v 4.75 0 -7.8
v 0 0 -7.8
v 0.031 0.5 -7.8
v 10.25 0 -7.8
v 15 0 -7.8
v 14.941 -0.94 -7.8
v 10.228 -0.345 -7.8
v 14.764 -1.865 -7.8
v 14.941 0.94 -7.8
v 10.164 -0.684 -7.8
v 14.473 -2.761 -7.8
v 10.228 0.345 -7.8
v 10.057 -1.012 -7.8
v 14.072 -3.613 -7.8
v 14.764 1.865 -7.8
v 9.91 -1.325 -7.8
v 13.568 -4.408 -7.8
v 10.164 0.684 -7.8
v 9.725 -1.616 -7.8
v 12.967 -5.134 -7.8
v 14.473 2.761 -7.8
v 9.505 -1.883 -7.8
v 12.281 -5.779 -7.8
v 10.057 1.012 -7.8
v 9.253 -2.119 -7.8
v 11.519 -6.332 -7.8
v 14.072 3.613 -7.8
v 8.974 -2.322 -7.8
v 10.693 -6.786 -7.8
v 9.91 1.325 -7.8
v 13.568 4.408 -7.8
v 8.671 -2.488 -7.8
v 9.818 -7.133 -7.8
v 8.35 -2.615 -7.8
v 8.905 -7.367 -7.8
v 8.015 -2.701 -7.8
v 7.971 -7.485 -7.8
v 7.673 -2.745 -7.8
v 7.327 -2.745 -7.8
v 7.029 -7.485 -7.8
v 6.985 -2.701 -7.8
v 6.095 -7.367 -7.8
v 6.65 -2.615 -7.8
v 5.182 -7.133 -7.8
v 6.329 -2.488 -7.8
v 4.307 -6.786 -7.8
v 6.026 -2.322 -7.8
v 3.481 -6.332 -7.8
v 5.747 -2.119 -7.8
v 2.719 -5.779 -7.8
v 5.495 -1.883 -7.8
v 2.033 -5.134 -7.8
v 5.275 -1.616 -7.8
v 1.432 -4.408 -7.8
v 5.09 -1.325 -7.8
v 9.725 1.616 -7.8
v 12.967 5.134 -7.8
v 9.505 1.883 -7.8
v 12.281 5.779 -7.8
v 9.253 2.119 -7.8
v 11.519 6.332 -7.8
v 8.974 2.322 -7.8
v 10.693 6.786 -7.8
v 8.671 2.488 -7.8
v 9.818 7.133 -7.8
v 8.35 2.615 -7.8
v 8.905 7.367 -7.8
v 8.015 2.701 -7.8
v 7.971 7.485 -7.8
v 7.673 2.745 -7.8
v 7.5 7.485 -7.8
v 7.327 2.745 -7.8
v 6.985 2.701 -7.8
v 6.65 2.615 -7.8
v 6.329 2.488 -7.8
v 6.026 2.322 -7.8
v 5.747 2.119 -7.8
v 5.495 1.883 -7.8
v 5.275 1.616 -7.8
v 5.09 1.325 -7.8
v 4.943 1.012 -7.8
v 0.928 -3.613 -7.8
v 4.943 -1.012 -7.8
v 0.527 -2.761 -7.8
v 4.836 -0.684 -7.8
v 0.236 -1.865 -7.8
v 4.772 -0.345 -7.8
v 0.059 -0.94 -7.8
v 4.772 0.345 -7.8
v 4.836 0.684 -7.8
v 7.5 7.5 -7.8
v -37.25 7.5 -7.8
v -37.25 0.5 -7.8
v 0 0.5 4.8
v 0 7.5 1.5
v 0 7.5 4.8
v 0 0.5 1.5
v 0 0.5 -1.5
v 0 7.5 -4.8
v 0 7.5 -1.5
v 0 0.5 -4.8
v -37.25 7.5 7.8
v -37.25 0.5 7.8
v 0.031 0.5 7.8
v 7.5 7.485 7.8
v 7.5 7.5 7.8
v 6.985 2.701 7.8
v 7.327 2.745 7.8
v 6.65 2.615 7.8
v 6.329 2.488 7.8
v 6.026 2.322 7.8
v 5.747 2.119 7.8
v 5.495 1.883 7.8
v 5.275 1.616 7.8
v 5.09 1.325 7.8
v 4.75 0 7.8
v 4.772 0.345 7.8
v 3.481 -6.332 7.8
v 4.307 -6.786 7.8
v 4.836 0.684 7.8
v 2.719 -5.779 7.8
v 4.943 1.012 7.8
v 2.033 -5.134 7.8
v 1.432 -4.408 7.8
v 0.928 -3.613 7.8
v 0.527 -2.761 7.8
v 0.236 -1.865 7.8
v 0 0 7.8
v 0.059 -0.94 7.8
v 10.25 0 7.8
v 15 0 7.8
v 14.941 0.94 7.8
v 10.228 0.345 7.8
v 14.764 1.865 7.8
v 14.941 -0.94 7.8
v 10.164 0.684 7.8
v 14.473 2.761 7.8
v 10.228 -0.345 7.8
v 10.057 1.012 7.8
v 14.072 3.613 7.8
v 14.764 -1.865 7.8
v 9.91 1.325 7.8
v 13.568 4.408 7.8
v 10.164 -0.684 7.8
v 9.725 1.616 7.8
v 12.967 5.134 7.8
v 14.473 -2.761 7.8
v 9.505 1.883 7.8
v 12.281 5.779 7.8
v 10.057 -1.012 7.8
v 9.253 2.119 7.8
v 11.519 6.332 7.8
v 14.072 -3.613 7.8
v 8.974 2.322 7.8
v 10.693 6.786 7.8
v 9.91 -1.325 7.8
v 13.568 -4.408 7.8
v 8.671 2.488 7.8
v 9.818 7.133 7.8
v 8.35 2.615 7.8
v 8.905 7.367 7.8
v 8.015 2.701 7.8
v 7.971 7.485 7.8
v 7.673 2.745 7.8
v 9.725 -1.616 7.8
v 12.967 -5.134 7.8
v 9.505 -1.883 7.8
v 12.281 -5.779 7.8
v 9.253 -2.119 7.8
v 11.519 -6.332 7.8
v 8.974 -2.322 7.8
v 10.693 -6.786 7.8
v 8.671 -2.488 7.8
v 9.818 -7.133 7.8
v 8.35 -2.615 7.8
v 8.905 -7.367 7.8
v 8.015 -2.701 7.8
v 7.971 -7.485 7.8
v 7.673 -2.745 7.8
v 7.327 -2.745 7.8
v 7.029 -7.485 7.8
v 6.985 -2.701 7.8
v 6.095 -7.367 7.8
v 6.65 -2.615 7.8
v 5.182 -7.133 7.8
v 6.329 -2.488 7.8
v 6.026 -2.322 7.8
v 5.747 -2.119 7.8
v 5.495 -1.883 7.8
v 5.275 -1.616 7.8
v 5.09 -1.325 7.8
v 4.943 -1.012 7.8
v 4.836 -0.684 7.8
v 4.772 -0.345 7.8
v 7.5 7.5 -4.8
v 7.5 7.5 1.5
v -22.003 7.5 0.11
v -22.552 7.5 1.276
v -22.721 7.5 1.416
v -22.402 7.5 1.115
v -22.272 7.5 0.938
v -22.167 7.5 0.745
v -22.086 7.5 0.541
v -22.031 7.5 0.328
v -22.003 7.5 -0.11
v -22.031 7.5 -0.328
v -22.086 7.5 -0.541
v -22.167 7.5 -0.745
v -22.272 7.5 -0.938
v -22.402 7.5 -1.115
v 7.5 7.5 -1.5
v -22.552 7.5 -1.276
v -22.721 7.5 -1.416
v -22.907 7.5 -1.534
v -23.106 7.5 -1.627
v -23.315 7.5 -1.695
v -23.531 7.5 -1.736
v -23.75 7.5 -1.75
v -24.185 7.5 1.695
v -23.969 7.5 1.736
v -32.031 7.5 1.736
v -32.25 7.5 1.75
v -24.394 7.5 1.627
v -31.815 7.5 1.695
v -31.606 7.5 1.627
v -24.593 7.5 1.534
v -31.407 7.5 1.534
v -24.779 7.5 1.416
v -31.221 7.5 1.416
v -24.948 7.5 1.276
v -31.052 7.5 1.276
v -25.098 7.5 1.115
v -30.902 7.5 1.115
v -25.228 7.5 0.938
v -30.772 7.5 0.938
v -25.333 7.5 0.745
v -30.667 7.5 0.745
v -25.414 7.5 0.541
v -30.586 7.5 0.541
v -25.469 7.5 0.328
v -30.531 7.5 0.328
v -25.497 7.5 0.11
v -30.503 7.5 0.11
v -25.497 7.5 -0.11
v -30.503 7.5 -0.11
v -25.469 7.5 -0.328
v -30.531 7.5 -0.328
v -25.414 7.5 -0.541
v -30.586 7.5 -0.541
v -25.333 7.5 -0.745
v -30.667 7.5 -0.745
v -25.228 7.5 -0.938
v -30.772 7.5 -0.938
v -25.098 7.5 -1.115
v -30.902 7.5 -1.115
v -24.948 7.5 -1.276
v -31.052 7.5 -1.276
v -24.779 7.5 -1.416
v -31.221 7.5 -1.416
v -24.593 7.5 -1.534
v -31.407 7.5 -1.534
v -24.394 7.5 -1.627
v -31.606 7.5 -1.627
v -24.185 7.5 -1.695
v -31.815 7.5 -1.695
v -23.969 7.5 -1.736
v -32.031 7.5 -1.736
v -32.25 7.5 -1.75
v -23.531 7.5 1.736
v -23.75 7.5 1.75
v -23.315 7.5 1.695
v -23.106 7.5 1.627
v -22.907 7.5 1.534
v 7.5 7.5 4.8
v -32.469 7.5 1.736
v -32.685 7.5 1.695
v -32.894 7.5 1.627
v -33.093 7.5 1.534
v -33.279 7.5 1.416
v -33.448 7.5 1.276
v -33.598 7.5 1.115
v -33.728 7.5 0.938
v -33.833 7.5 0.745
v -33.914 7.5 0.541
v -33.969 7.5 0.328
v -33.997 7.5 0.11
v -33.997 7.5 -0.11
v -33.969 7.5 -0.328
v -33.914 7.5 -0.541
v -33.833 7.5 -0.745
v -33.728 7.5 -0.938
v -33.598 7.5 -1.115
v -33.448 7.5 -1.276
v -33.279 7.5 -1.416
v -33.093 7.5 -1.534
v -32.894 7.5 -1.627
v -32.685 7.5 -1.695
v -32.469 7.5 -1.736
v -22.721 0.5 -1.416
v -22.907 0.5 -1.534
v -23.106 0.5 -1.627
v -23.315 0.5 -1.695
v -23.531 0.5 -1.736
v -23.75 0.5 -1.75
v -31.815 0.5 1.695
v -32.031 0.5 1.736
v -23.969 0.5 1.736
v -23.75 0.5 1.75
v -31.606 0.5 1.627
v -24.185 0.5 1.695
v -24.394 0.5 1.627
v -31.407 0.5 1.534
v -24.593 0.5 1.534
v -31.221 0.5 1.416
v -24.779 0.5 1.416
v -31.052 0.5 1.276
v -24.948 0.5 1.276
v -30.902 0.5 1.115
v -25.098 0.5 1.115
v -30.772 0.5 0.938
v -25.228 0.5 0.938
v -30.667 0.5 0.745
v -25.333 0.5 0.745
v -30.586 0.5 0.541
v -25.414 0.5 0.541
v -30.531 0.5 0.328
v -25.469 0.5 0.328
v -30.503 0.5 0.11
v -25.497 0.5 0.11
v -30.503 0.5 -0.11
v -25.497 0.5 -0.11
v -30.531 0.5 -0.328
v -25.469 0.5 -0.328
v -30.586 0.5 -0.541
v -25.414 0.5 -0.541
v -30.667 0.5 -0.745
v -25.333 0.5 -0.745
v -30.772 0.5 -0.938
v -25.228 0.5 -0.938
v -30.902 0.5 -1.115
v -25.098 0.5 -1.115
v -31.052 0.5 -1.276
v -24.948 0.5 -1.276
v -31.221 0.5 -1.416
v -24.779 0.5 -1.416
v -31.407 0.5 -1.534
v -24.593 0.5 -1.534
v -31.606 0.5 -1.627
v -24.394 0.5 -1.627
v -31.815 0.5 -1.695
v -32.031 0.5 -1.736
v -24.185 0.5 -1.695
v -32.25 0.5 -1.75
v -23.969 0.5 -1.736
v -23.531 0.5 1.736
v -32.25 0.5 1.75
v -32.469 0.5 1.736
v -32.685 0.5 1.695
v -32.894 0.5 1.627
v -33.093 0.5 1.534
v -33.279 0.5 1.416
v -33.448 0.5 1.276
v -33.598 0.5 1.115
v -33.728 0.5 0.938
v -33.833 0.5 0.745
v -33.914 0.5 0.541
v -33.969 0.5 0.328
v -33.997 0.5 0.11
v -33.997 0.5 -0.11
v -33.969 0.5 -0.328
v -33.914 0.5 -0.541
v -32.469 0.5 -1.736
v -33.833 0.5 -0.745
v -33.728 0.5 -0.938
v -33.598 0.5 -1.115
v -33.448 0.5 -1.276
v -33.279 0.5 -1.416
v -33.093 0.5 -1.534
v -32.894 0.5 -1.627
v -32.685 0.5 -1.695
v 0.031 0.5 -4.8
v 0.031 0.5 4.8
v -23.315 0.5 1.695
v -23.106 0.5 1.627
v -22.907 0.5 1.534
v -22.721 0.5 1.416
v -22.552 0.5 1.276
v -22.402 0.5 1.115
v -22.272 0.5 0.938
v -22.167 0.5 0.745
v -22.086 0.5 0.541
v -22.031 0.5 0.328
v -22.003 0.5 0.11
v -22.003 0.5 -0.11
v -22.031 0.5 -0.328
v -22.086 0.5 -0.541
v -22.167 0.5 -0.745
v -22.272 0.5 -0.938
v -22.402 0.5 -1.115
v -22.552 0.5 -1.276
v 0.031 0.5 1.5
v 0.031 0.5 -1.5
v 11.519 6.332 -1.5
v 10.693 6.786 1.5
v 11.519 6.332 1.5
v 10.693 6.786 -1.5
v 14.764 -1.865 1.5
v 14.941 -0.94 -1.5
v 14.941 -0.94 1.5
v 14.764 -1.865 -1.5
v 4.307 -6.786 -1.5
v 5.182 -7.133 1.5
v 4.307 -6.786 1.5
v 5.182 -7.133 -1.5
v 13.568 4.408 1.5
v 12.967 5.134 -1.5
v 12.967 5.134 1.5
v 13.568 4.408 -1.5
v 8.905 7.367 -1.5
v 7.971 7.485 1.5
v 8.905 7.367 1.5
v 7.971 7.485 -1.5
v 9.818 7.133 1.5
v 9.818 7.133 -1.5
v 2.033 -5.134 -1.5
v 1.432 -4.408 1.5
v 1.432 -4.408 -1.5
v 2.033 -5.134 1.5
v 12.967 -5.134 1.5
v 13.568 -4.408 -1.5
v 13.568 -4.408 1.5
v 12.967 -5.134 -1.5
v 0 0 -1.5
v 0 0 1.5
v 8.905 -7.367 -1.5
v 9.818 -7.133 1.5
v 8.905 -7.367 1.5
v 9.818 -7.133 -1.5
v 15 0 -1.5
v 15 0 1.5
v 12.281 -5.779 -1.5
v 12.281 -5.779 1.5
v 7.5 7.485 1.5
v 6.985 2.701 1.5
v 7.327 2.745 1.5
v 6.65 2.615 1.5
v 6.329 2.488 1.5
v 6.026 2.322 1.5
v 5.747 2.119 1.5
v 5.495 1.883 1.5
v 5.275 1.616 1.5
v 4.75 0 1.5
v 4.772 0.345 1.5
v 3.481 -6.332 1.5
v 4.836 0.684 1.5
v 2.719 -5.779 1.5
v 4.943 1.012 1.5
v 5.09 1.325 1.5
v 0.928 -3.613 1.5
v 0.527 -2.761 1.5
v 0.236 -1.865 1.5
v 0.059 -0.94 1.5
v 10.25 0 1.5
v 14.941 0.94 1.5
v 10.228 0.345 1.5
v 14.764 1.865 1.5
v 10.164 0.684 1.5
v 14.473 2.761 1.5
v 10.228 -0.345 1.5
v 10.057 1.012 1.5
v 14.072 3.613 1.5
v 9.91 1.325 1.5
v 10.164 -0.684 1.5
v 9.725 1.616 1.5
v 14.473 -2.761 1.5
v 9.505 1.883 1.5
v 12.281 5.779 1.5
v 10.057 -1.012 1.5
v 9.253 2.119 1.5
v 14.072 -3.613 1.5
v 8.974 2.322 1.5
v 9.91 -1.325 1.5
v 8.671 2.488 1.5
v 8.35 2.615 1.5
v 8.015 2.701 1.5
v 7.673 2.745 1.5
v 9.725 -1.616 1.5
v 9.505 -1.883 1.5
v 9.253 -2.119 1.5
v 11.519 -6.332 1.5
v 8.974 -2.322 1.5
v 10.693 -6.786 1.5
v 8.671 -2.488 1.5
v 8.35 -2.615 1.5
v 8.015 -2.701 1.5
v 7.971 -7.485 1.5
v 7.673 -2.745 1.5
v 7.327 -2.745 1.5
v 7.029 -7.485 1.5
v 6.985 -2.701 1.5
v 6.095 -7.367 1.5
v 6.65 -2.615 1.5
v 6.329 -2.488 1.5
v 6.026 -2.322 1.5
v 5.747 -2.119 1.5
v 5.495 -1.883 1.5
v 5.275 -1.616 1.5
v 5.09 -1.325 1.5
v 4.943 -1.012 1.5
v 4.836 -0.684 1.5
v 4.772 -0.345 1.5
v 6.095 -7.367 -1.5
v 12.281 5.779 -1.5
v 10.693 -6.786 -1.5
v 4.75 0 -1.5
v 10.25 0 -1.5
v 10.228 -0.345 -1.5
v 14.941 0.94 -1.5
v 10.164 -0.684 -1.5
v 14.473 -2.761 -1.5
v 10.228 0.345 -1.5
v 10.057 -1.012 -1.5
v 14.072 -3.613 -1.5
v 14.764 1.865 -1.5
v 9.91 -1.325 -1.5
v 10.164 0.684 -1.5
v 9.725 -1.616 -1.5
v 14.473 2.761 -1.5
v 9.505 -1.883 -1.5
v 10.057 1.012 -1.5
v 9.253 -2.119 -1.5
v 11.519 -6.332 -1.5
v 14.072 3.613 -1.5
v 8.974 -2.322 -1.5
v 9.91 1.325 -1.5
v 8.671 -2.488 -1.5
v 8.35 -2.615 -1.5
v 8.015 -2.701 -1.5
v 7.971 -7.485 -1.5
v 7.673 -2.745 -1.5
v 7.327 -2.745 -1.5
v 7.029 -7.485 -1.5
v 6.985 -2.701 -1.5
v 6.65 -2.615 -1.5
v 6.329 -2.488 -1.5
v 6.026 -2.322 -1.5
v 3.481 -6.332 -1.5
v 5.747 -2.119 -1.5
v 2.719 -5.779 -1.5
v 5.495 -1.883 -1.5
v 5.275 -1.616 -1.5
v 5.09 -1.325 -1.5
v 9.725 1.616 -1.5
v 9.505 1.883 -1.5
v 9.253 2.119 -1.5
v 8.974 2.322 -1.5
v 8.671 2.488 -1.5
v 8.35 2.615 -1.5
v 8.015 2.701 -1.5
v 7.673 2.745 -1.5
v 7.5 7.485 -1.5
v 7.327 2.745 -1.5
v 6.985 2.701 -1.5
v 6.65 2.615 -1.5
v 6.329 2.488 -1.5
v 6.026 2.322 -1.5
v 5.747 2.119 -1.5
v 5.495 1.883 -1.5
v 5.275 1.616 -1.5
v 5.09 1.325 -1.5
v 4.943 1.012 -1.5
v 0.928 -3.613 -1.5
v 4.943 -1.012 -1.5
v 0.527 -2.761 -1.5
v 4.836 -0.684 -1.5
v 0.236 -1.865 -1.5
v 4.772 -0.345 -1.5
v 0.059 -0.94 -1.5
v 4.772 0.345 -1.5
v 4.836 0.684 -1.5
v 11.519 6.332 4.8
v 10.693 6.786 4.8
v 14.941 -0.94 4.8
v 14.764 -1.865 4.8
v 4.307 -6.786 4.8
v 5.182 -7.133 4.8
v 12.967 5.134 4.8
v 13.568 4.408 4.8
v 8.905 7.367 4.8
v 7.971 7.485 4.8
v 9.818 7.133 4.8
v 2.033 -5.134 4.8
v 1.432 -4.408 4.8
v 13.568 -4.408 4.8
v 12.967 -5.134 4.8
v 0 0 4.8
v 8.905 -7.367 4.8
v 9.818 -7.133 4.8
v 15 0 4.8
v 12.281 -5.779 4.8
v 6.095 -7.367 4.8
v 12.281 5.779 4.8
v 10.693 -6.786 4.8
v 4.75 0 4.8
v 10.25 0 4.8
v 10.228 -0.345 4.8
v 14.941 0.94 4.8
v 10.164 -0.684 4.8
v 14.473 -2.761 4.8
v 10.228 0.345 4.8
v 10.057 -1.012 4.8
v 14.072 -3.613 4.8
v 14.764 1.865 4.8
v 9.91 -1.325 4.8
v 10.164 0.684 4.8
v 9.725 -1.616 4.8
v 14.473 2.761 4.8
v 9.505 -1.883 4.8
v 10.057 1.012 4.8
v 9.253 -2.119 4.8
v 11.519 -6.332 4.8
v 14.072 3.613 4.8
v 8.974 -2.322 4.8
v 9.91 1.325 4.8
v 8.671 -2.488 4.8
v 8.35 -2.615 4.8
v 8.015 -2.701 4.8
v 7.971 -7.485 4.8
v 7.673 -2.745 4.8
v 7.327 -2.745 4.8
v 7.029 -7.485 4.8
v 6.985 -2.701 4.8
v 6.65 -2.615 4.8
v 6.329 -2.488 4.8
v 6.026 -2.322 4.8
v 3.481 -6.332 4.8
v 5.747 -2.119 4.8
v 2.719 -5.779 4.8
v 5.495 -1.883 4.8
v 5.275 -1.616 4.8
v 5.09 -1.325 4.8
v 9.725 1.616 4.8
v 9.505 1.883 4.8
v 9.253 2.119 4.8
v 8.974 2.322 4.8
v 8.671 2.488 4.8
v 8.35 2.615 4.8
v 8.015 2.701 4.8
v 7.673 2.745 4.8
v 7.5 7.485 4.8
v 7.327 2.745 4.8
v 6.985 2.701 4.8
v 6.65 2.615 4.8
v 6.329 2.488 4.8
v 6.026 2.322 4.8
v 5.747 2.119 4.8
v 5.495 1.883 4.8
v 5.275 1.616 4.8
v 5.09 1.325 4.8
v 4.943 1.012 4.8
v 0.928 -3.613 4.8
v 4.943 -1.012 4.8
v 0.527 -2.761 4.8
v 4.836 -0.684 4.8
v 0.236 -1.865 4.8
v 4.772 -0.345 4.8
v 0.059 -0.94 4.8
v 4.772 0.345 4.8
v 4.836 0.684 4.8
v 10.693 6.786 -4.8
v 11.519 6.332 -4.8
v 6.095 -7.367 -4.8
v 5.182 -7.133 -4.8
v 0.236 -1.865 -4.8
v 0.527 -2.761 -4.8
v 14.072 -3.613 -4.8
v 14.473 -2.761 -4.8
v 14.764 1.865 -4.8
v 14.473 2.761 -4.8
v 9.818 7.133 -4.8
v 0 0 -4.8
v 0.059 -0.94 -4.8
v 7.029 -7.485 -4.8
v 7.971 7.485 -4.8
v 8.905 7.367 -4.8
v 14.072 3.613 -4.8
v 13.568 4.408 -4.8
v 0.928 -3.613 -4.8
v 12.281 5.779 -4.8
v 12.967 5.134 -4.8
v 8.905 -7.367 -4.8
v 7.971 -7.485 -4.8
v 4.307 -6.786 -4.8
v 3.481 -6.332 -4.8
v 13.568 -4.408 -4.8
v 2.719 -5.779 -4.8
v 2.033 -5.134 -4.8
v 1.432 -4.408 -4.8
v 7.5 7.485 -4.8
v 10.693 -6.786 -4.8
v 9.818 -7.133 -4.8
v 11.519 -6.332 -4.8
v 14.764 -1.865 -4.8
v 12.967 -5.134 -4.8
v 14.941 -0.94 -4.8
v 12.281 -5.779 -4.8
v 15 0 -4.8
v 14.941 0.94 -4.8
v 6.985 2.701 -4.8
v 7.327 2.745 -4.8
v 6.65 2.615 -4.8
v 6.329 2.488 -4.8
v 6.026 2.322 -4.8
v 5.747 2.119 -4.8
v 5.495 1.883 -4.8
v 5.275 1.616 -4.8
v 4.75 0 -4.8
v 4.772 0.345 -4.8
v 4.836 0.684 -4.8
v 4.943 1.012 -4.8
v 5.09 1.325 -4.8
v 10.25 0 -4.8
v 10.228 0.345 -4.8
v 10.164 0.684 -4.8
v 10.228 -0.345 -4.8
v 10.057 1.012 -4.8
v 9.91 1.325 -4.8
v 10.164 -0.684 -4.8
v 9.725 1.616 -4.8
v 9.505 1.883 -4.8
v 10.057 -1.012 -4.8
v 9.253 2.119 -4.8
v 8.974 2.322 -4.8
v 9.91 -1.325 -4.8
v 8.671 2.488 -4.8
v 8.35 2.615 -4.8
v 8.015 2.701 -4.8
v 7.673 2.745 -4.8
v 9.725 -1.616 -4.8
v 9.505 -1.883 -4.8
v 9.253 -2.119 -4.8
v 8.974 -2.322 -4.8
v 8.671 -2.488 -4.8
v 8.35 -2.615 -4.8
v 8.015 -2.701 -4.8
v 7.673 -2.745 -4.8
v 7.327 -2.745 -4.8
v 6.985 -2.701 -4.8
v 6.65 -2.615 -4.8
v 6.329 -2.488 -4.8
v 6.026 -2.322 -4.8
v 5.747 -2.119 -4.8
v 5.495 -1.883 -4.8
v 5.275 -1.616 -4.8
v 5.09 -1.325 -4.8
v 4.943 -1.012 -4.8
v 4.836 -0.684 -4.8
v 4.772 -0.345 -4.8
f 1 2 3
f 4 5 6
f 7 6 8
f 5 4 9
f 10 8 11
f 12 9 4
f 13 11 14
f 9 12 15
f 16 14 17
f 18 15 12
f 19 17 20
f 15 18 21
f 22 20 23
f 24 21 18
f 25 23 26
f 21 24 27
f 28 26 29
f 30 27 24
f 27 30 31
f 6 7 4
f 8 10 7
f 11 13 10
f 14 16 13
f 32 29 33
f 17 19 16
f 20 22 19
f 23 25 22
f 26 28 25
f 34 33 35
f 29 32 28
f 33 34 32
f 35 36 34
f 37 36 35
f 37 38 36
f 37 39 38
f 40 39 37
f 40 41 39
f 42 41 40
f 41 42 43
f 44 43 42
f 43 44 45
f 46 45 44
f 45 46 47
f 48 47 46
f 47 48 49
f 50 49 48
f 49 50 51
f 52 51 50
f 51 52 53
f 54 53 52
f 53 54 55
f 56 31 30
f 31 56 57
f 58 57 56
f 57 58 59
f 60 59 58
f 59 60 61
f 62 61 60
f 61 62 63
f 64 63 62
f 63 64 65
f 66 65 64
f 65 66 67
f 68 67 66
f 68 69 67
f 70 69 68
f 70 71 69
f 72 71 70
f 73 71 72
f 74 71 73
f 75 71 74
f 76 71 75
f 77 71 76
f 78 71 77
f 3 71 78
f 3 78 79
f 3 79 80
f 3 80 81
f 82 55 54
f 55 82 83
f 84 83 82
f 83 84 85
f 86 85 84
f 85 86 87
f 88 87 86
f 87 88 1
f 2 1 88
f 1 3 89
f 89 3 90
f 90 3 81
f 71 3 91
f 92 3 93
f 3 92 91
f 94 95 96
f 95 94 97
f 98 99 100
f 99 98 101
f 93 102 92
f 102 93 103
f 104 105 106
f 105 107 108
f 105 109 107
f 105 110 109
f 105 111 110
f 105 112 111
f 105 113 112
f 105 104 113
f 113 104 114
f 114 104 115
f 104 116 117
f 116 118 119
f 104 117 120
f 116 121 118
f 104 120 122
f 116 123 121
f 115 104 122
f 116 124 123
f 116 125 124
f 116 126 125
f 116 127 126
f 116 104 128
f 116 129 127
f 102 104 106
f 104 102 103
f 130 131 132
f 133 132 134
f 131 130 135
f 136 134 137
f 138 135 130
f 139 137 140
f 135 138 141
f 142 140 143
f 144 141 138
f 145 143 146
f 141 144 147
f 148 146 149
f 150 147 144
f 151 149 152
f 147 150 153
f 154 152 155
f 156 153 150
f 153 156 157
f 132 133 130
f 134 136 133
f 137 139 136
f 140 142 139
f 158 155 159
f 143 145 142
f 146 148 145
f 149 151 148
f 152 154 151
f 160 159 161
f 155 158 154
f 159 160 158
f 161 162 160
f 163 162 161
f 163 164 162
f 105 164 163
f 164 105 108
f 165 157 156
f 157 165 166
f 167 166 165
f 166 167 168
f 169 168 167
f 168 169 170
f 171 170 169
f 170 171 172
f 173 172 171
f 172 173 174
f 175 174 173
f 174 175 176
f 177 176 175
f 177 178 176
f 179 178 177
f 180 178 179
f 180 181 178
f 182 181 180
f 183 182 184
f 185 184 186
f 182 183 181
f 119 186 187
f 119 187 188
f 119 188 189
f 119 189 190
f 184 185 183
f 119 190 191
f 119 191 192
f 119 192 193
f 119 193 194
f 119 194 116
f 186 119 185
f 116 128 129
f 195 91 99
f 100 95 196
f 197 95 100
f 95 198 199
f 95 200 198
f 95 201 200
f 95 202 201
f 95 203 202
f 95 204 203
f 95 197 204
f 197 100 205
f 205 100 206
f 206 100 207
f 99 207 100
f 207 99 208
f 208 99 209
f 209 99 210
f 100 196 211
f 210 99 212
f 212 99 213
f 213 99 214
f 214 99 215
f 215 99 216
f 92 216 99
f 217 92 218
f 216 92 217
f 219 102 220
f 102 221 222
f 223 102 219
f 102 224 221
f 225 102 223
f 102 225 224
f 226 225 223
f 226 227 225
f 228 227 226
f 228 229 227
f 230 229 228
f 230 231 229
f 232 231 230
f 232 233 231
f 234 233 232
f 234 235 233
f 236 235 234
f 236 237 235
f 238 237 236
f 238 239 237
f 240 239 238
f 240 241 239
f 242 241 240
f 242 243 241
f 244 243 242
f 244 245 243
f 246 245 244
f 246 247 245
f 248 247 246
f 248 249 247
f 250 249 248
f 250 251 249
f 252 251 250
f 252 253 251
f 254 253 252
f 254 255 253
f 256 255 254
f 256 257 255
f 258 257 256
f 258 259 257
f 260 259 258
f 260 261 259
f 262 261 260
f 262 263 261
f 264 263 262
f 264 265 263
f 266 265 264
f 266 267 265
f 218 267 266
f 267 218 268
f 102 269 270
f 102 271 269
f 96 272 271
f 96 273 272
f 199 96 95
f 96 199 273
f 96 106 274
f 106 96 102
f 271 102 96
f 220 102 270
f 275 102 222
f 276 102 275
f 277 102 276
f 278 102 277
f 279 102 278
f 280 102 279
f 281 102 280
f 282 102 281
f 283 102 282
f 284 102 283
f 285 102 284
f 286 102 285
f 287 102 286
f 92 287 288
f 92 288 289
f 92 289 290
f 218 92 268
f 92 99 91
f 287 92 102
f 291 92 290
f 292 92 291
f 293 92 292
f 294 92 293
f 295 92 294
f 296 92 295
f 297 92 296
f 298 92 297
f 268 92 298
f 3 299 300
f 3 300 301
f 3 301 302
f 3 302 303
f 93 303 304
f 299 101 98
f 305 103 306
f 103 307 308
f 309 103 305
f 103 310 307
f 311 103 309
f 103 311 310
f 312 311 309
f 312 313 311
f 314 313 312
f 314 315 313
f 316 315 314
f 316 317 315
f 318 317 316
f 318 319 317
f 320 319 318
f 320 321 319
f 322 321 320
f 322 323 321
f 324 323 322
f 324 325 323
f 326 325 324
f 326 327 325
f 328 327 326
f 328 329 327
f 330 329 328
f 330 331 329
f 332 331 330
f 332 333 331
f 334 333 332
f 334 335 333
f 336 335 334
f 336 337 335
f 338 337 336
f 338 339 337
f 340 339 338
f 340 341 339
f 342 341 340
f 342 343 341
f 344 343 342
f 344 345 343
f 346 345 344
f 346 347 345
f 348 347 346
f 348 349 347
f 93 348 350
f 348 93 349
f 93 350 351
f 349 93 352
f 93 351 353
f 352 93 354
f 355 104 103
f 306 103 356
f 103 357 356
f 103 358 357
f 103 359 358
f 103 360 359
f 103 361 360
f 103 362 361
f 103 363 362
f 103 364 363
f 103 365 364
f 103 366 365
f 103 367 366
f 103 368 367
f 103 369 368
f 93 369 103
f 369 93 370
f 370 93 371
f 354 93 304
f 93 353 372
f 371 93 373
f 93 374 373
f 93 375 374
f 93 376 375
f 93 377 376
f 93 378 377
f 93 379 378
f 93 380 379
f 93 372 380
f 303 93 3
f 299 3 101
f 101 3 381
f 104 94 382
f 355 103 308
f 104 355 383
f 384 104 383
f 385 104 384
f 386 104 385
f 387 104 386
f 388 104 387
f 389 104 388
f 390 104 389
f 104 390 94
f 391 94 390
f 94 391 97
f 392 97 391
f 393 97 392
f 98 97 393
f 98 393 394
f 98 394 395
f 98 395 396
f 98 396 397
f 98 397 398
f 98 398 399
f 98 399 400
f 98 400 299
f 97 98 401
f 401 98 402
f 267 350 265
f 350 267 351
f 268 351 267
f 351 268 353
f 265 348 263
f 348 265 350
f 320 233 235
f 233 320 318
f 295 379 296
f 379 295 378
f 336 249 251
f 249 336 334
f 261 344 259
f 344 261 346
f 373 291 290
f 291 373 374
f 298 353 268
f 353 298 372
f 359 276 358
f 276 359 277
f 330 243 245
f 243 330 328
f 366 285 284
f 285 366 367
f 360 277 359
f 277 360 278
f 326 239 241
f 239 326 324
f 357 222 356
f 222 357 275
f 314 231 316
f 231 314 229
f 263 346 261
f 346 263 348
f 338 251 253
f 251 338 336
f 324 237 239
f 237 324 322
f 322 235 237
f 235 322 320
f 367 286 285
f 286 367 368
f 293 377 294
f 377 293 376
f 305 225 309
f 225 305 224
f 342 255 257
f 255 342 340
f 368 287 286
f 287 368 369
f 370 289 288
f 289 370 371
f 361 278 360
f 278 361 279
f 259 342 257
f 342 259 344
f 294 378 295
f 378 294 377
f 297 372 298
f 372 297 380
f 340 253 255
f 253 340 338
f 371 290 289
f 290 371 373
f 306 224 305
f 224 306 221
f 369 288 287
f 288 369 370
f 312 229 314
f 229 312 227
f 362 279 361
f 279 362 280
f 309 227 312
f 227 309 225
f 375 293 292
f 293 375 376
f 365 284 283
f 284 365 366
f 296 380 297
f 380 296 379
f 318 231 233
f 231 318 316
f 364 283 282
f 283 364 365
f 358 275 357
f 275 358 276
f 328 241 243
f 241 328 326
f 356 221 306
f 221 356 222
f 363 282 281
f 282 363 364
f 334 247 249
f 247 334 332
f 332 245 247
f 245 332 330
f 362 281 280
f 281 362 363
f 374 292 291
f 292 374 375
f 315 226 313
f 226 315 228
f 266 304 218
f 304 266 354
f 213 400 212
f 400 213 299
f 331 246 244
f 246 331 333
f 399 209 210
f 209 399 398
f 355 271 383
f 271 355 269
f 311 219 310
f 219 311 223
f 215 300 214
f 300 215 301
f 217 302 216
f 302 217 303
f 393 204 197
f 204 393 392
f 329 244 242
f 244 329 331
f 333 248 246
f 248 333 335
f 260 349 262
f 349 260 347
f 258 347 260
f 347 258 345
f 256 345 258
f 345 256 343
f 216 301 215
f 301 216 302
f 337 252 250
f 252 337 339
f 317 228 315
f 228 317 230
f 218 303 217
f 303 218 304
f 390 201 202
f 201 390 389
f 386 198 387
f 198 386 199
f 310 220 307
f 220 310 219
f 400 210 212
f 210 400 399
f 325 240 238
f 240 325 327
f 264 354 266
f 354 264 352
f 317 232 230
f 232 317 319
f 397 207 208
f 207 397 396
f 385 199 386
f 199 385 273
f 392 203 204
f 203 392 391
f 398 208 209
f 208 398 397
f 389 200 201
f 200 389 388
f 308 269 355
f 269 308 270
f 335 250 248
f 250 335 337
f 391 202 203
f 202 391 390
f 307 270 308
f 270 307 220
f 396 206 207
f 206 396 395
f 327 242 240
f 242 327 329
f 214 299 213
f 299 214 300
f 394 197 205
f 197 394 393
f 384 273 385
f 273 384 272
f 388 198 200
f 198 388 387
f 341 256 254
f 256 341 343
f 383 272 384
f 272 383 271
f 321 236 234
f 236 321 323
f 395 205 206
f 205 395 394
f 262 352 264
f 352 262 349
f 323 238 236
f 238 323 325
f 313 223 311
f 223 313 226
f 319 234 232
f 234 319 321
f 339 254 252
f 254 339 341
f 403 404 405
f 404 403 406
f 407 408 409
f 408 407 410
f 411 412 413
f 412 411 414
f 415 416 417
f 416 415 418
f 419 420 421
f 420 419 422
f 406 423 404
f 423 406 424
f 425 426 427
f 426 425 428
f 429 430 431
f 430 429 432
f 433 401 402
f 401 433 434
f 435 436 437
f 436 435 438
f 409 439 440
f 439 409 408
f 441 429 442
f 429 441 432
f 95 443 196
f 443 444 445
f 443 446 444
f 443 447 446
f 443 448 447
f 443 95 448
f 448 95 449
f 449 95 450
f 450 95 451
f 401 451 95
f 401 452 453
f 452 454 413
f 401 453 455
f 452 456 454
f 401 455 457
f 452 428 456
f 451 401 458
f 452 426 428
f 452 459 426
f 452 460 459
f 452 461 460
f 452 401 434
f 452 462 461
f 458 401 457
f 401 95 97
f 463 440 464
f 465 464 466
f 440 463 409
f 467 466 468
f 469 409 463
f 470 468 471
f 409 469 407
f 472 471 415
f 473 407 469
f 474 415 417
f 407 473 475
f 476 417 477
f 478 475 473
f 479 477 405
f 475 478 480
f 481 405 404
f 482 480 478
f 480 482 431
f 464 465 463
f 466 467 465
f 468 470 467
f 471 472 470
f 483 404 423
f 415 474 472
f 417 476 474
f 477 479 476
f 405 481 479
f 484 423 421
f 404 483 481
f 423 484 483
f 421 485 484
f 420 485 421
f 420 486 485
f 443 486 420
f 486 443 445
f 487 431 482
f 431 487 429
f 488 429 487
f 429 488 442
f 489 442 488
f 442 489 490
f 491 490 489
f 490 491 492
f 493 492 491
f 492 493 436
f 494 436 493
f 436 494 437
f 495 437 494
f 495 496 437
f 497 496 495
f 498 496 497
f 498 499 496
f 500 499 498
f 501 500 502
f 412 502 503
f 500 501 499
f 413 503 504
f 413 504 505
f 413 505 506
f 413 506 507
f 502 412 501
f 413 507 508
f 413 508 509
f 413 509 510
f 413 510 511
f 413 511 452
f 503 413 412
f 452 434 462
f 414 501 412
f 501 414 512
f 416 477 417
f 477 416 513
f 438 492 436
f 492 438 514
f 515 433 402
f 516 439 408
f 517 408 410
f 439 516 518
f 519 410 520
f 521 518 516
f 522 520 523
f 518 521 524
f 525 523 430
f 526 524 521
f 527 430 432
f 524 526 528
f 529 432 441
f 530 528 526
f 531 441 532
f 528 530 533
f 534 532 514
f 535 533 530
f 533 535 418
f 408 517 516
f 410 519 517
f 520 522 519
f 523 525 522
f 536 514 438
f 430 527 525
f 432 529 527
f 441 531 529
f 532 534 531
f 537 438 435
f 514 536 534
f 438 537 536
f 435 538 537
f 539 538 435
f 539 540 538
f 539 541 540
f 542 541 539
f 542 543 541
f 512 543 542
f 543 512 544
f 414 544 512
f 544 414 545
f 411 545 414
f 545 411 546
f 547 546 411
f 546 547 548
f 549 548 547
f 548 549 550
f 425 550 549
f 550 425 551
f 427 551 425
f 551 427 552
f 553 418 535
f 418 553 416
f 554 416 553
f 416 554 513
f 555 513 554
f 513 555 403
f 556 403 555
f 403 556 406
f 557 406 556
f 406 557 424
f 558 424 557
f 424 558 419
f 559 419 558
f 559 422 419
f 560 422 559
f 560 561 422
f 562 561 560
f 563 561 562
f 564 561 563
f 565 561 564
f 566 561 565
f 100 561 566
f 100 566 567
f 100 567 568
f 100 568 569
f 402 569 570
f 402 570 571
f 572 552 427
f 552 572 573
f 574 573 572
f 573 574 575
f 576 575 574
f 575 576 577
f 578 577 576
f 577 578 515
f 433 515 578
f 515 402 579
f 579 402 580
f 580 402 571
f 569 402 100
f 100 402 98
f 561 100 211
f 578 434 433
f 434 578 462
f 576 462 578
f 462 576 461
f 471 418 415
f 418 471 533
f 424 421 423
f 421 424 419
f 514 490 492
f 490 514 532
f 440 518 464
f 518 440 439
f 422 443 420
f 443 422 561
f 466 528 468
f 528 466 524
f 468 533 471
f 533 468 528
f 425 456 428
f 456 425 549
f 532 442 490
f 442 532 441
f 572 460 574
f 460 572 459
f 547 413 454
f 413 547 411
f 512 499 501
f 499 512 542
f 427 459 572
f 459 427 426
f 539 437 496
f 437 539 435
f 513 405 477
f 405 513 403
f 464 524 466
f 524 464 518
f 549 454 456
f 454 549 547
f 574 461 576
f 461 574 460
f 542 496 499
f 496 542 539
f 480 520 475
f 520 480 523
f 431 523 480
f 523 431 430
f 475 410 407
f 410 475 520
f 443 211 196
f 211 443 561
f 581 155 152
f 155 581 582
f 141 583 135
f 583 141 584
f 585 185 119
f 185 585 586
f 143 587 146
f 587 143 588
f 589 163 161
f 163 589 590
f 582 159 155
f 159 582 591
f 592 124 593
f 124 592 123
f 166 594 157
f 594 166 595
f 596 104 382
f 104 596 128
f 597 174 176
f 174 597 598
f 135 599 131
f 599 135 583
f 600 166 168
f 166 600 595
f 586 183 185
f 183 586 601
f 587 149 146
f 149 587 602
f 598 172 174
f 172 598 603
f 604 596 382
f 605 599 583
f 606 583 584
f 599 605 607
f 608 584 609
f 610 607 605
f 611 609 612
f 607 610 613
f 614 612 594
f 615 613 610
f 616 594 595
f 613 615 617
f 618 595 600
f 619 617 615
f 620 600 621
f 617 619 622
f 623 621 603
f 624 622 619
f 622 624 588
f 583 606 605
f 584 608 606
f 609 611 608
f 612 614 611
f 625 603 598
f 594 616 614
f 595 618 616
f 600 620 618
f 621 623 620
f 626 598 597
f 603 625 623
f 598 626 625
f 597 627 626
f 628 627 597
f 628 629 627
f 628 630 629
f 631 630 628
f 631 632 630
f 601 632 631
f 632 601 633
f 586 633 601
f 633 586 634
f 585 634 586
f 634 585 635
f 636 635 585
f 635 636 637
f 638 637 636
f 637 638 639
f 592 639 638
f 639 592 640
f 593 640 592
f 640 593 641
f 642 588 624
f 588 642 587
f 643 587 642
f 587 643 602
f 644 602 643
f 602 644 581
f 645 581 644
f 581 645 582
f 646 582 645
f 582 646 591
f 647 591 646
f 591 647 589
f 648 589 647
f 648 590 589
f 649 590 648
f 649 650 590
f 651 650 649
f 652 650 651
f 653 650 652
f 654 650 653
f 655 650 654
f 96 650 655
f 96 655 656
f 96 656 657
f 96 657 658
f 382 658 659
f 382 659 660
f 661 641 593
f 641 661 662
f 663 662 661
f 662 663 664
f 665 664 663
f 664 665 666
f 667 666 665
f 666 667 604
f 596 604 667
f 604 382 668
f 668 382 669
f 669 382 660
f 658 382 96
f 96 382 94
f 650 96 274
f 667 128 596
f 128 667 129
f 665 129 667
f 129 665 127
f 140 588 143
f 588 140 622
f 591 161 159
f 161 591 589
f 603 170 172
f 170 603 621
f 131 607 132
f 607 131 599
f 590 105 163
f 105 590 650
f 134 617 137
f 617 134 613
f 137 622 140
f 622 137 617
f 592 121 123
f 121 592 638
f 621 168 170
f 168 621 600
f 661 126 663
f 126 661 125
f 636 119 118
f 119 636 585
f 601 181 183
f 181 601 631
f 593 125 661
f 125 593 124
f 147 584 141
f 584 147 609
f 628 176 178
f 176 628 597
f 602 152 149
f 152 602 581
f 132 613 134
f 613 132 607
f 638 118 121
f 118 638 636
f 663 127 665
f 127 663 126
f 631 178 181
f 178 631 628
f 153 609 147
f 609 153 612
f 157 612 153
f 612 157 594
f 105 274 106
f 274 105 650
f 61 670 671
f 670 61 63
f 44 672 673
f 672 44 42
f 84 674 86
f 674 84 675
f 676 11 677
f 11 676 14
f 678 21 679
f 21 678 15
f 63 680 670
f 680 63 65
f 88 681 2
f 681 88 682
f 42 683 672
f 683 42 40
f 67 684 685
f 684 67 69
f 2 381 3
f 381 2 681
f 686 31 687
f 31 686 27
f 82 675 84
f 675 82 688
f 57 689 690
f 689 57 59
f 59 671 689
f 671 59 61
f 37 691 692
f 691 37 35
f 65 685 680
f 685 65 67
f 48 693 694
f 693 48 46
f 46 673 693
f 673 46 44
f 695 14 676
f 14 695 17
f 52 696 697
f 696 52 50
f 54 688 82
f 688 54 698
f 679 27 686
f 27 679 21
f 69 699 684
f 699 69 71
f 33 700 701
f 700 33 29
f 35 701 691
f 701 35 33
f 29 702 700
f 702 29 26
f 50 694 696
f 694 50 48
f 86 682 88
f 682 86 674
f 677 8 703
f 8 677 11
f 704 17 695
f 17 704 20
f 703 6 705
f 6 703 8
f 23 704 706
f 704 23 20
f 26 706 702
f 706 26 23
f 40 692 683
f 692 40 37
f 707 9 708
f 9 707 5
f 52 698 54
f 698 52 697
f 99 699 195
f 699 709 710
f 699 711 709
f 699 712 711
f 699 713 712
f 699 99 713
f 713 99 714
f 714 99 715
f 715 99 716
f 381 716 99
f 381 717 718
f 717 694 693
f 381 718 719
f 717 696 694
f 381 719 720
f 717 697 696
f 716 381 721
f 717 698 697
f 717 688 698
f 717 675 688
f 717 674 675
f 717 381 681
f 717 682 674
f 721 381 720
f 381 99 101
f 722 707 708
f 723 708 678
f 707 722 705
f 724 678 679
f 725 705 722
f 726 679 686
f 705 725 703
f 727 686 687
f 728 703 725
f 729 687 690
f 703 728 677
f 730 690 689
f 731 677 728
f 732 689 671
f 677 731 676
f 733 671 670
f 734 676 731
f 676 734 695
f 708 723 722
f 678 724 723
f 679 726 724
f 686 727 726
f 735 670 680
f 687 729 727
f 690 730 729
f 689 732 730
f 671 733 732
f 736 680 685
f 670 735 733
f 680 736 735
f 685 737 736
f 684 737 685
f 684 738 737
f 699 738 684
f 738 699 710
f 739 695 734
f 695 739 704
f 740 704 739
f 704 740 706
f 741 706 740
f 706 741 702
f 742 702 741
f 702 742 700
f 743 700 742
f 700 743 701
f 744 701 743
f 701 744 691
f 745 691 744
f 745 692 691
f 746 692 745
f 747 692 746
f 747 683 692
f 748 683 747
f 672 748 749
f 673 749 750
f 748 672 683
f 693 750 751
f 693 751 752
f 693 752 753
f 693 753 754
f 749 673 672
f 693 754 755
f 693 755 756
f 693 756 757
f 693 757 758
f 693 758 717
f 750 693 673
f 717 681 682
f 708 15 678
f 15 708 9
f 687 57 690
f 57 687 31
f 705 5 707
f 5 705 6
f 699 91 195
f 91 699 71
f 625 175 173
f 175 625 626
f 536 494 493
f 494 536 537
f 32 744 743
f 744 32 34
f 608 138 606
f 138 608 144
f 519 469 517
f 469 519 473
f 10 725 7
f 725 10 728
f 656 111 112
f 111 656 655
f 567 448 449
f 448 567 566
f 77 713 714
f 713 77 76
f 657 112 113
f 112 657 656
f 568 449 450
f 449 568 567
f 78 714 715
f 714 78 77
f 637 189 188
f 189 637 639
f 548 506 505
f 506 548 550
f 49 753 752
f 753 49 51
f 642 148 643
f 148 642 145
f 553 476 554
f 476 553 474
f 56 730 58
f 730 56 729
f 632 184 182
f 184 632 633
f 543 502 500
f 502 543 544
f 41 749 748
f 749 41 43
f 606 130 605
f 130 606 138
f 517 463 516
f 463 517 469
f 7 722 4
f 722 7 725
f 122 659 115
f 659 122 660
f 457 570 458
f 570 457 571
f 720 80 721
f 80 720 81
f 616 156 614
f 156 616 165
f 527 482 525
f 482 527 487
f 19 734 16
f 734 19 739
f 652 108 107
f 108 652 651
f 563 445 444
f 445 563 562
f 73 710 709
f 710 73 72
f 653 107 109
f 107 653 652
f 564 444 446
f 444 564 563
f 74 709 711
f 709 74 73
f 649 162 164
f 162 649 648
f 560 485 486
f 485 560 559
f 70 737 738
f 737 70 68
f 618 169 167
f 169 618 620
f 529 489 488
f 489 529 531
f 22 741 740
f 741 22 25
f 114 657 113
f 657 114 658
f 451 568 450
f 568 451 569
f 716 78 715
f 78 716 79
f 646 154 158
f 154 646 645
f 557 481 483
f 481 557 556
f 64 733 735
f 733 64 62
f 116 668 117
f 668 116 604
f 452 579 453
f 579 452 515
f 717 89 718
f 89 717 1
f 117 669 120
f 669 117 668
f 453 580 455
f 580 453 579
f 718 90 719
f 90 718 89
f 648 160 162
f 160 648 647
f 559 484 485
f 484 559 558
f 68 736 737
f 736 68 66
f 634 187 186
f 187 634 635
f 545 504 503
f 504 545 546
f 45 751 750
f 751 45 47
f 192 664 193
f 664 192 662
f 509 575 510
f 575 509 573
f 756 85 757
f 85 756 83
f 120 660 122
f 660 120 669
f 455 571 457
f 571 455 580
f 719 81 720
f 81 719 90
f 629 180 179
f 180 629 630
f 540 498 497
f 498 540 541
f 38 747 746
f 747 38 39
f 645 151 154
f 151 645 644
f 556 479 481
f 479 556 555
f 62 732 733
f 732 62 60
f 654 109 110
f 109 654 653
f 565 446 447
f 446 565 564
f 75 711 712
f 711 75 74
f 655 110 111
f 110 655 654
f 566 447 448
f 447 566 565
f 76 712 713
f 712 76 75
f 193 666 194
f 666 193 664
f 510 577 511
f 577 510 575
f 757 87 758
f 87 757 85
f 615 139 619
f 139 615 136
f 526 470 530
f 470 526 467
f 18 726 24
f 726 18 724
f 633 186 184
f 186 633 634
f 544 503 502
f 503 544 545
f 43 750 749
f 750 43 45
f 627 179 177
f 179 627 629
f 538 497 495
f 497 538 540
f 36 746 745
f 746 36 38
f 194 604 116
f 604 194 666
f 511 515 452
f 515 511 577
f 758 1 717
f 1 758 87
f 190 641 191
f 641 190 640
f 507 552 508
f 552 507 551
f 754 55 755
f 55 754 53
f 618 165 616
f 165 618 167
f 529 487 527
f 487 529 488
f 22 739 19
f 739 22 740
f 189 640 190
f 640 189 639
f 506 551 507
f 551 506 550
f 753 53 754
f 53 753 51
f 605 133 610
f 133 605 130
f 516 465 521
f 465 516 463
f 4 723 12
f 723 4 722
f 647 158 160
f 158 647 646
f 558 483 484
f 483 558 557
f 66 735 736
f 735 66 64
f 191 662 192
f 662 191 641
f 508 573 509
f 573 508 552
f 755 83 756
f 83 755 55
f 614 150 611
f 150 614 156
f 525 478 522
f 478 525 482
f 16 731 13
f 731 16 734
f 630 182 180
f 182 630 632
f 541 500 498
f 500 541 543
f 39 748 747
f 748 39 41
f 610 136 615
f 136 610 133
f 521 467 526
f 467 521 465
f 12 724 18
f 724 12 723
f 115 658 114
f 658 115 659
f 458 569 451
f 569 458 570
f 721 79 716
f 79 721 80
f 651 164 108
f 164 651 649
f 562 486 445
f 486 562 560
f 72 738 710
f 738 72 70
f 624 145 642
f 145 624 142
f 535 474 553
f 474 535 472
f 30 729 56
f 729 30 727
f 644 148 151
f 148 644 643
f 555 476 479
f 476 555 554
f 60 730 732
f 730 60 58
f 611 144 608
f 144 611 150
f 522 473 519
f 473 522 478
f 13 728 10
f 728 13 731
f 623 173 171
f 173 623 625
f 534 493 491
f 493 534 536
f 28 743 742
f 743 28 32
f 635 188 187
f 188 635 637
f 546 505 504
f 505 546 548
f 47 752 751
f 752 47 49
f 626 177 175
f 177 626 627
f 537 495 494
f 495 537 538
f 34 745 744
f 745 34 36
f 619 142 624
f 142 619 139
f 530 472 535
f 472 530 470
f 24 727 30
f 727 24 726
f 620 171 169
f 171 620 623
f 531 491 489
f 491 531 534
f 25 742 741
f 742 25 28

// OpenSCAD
//**********************************************************************************************
//This is my attempt at a GoPro3 mount for my Quadcopter (Dualsky Hornet 460)
//It has been designed to be printable without support and strong
//By specifying the extrusion width you will be printing and setting perimeters to 3 (in slic3r)
//printing will be pretty quick.
//**********************************************************************************************

//mm


$fn=50;


//layer height used when printing
layerHeight=.3;

//extrusionwidth to use when printing
extrusionWidth=.7;


//Camera Dimensions
//I have added 2mm to camera dimensions to allow for padding
//to be inserted
cameraLength=61;
cameraWidth=23;
cameraHeight=43;
cameraLenseHeight=8;
cameraLenseDiameter=25;


//located 27.5mm from the bottom and 44.5mm from the left edge	 on my gopro3
lenseXOffset=-(44.5-cameraLength/2);
lenseZOffset=28-cameraHeight/2;


//Base to be mounted on top plate of hornet 460. Not used but may need it in future on
baseSupportDiameter=10;
baseSupportHeight=10;
baseSupportScrewDiameter=4.5;

	
//Thickness of walls. Increase to make stronger
wallThickness=4*extrusionWidth;

//Dimensions for GoPro hinge
hingeDiameter=15;
hingeThickness=3;
hingeGap=3.3;
hingeBoltDiameter=5.5;
hingeYOffset=(cameraWidth+2*wallThickness-hingeDiameter)/2;
        
//Back door securing tab dimensions
tabDiameter=10;
tabScrewDiameter=3.5;        
RHStabOffset=10;
topTabXOffset=10;


//Arm to attach gopro mount to hornet 460
bracketLength=25+7.5+3;
bracketHoleSpacing=8.5;
bracketScrewDiameter=3.5;

//Opening for USB plug (for FPV)
usbPlugLength=wallThickness+.1;
usbPlugWidth=15;
usbPlugHeight=13;

//wifi button
//10mm from back and 9.5mm from bottom left
wifiButtonDiameter=5.5;
wifiButtonYOffset=10;
wifiButtonZOffset=9.5;

tolerance=.0001;

//model of camera
module hero3()
{

	//body of camera
	cube([cameraLength,cameraWidth,cameraHeight],true);

	//lense of camera
	translate([lenseXOffset,cameraWidth/2,lenseZOffset])
	rotate([-90,0,0])
	cylinder(cameraLenseHeight,cameraLenseDiameter/2,cameraLenseDiameter/2);

   //body of camera
   cube([cameraLength,cameraWidth,cameraHeight],true);


   //lense of camera
   translate([lenseXOffset,cameraWidth/2,lenseZOffset])
   rotate([-90,0,0])
   cylinder(cameraLenseHeight,cameraLenseDiameter/2,cameraLenseDiameter/2);

}


//space needed for usb plug
module usbPlugCutout()
{

	//	rotate([180,0,0])s
	//usb plug locate 5mm from front and 10mm from bottom
	translate([-cameraLength/2-usbPlugLength/2,-(usbPlugWidth/2-cameraWidth/2),12-cameraHeight/2])
	cube([usbPlugLength,usbPlugWidth,usbPlugHeight],true);

}

module wifiButtonCutout()
{


	translate([(cameraLength+wallThickness+tolerance)/2,-cameraWidth/2+wifiButtonYOffset,-cameraHeight/2+wifiButtonZOffset])
	rotate([0,90,0])
	#cylinder(wallThickness+tolerance+50,wifiButtonDiameter/2,wifiButtonDiameter/2,true);

}

module mountingBracket()
{

hingeOffset=8;
        difference()
        {
                //main shaft        
                translate([0,hingeOffset/2,-(bracketLength-hingeDiameter/2+bracketHoleSpacing/2+5)/2])
                cube([hingeThickness*3+2*hingeGap,hingeDiameter-hingeOffset,bracketLength-hingeDiameter/2+bracketHoleSpacing/2+5],true);
        
                //minus mounting screws
                translate([0,0,-(bracketLength-hingeDiameter/2+bracketHoleSpacing/2)])
                rotate([90,0,0])
                cylinder(hingeDiameter+tolerance,bracketScrewDiameter/2,bracketScrewDiameter/2,true);


                translate([0,0,-(bracketLength-hingeDiameter/2-bracketHoleSpacing/2)])
                rotate([90,0,0])
                cylinder(hingeDiameter+tolerance,bracketScrewDiameter/2,bracketScrewDiameter/2,true);


        }        


        difference()
        {
                union()
                {
                                //hinge cylinder middle
                                translate([0,0,hingeDiameter/2])        
                                rotate([0,90,0])
                                cylinder(hingeThickness,hingeDiameter/2,hingeDiameter/2,true);


                                //hinge cylinder bottombit middle
                                translate([0,hingeOffset/2,hingeDiameter/4])
                                cube([hingeThickness,hingeDiameter-hingeOffset,hingeDiameter/2],true);


                                //hinge cylinder RHS
                                translate([-(hingeThickness+hingeGap),0,hingeDiameter/2])        
                                rotate([0,90,0])
                                cylinder(hingeThickness,hingeDiameter/2,hingeDiameter/2,true);


                                //hinge cylinder bottombit RHS
                                translate([-(hingeThickness+hingeGap),hingeOffset/2,hingeDiameter/4])
                                cube([hingeThickness,hingeDiameter-hingeOffset,hingeDiameter/2],true);


                                //hinge cylinder LHS
                                translate([(hingeThickness+hingeGap),0,hingeDiameter/2])        
                                rotate([0,90,0])
                                cylinder(hingeThickness,hingeDiameter/2,hingeDiameter/2,true);


                                //hinge cylinder bottombit LHS
                                translate([(hingeThickness+hingeGap),hingeOffset/2,hingeDiameter/4])
                                cube([hingeThickness,hingeDiameter-hingeOffset,hingeDiameter/2],true);
                }
                //minus screw hole
                translate([0,0,hingeDiameter/2])
                rotate([0,90,0])
                cylinder(hingeThickness*3+2*hingeGap+tolerance,hingeBoltDiameter/2,hingeBoltDiameter/2,true);


        }//difference
}
module hinge()
{
        translate([(lenseXOffset),wallThickness,cameraHeight/2+wallThickness])
        {
        
                difference()
                {
                        union()
                        {
                                //hinge cylinder LHS
                                translate([hingeThickness/2+hingeGap/2,-hingeYOffset,hingeDiameter/2])        
                                rotate([0,90,0])
                                cylinder(hingeThickness,hingeDiameter/2,hingeDiameter/2,true);


                                //hinge cylinder bottombit LHS
                                translate([hingeThickness/2+hingeGap/2,-hingeYOffset,hingeDiameter/4])
                                cube([hingeThickness,hingeDiameter,hingeDiameter/2],true);


                                //hinge cylinder RHS
                                translate([-(hingeThickness/2+hingeGap/2),-hingeYOffset,hingeDiameter/2])        
                                rotate([0,90,0])
                                cylinder(hingeThickness,hingeDiameter/2,hingeDiameter/2,true);


                                //hinge cylinder bottombit RHS
                                translate([-(hingeThickness/2+hingeGap/2),-hingeYOffset,hingeDiameter/4])
                                cube([hingeThickness,hingeDiameter,hingeDiameter/2],true);
                        }


                translate([0,-hingeYOffset,hingeDiameter/2])
                rotate([0,90,0])
                cylinder(hingeThickness*2+hingeGap+tolerance,hingeBoltDiameter/2,hingeBoltDiameter/2,true);
                }
        }
        
}
module case()
{
        difference()
        {
                cube([cameraLength+wallThickness*2,cameraWidth+wallThickness*2,cameraHeight+wallThickness*2],true);
                translate([0,-wallThickness,0])


        
                usbPlugCutout();
                hero3();
						wifiButtonCutout();


        }
                //added geom for lense hole to avoid support material
        translate([lenseXOffset,cameraWidth/2,lenseZOffset])
        rotate([-90,0,0])
        cylinder(layerHeight,cameraLenseDiameter/2,cameraLenseDiameter/2);


        //TOP tab to attach back lid to
               translate([topTabXOffset,-(cameraWidth/2),(cameraHeight/2+wallThickness+tabDiameter/2)])
        {
                rotate([0,-90,0])
                {
                difference()
                {
                        union()
                        {
                                rotate([90,0,0])
                                #cylinder(wallThickness*2,tabDiameter/2,tabDiameter/2,true);
                                translate([-tabDiameter/4,0,0])
                                #cube([tabDiameter/2,wallThickness*2,tabDiameter],true);
                        }


                        //screw hole
                        rotate([90,0,0])
                        #cylinder(wallThickness*2+tolerance,tabScrewDiameter/2,tabScrewDiameter/2,true);
                }
                }
        }


        //RHS tab to attach back lid to
        translate([-(cameraLength/2+wallThickness+tabDiameter/2),-(cameraWidth/2),RHStabOffset])
        {
                rotate([0,180,0])
                {
                difference()
                {
                        union()
                        {
                                rotate([90,0,0])
                                cylinder(wallThickness*2,tabDiameter/2,tabDiameter/2,true);
                                translate([-tabDiameter/4,0,0])
                                cube([tabDiameter/2,wallThickness*2,tabDiameter],true);
                        }


                        //screw hole
                        rotate([90,0,0])
                        cylinder(wallThickness*2+tolerance,tabScrewDiameter/2,tabScrewDiameter/2,true);
                }
        }
}
        
        //Bottom tab to attach back lid to
        translate([0,-(cameraWidth/2),-(cameraHeight/2+wallThickness+tabDiameter/2)])
        {
                rotate([0,90,0])
                {
                difference()
                {
                        union()
                        {
                                rotate([90,0,0])
                                #cylinder(wallThickness*2,tabDiameter/2,tabDiameter/2,true);
                                translate([-tabDiameter/4,0,0])
                                #cube([tabDiameter/2,wallThickness*2,tabDiameter],true);
                        }


                        //screw hole
                        rotate([90,0,0])
                        #cylinder(wallThickness*2+tolerance,tabScrewDiameter/2,tabScrewDiameter/2,true);
                }
                }
        }


}





//base to mount to top plate of hornet 460
module bracketBase()
{




        //standoffs to allow flight controller to fit underneath
        rotate([0,0,0])
        translate([90/2,0,0])
        mountingHolePairs();
        
        rotate([0,0,90])
        translate([90/2,0,0])
        mountingHolePairs();


        rotate([0,0,180])
        translate([90/2,0,0])
        mountingHolePairs();


module caseBackDoor()
{
	intersection()
	{
		case();
		translate([0,-(cameraWidth/2+wallThickness/2),0])
		cube([cameraLength+2*wallThickness+tabDiameter*2+tolerance,wallThickness+tolerance,cameraHeight+2*wallThickness+tabDiameter*2+tolerance],true);
	}
}

module caseFront()
{
	difference()
	{
		union()
		{
		case();
		hinge();
		}
		translate([0,-(cameraWidth/2+wallThickness/2),0])
		cube([cameraLength+2*wallThickness+tabDiameter*2,wallThickness+.0001,cameraHeight+2*wallThickness+tabDiameter*2],true);
	}
}

rotate([90,0,0])
mountingBracket();


        rotate([0,0,270])
        translate([90/2,0,0])
        mountingHolePairs();
        
        //base of camera mounting plate
        translate([0,0,baseSupportHeight])
        cylinder(wallThickness,90/2+baseSupportDiameter,90/2+baseSupportDiameter);




}
//used in bracketBase()
module mountingHolePairs()
{
        //holes in top plate for screwing this contraption to are located
        //in pairs at 36mm hole centers.
        //these pairs are located 90mm apart        
        //need to look at top support with a ruler for this to make sense
        translate([0,36/2,0])
        difference()
        {
        cylinder(baseSupportHeight,baseSupportDiameter/2,baseSupportDiameter/2);
        //hole for screw thread to be tapped into
        cylinder(baseSupportHeight,baseSupportScrewDiameter/2,baseSupportScrewDiameter/2);
        }
        translate([0,-36/2,0])
        difference()
        {
        cylinder(baseSupportHeight,baseSupportDiameter/2,baseSupportDiameter/2);
        //hole for screw thread to be tapped into
        cylinder(baseSupportHeight,baseSupportScrewDiameter/2,baseSupportScrewDiameter/2);
        }
}





rotate([0,90,0])
mountingBracket();
//case();
//hinge();
//wifiButtonCutout();
